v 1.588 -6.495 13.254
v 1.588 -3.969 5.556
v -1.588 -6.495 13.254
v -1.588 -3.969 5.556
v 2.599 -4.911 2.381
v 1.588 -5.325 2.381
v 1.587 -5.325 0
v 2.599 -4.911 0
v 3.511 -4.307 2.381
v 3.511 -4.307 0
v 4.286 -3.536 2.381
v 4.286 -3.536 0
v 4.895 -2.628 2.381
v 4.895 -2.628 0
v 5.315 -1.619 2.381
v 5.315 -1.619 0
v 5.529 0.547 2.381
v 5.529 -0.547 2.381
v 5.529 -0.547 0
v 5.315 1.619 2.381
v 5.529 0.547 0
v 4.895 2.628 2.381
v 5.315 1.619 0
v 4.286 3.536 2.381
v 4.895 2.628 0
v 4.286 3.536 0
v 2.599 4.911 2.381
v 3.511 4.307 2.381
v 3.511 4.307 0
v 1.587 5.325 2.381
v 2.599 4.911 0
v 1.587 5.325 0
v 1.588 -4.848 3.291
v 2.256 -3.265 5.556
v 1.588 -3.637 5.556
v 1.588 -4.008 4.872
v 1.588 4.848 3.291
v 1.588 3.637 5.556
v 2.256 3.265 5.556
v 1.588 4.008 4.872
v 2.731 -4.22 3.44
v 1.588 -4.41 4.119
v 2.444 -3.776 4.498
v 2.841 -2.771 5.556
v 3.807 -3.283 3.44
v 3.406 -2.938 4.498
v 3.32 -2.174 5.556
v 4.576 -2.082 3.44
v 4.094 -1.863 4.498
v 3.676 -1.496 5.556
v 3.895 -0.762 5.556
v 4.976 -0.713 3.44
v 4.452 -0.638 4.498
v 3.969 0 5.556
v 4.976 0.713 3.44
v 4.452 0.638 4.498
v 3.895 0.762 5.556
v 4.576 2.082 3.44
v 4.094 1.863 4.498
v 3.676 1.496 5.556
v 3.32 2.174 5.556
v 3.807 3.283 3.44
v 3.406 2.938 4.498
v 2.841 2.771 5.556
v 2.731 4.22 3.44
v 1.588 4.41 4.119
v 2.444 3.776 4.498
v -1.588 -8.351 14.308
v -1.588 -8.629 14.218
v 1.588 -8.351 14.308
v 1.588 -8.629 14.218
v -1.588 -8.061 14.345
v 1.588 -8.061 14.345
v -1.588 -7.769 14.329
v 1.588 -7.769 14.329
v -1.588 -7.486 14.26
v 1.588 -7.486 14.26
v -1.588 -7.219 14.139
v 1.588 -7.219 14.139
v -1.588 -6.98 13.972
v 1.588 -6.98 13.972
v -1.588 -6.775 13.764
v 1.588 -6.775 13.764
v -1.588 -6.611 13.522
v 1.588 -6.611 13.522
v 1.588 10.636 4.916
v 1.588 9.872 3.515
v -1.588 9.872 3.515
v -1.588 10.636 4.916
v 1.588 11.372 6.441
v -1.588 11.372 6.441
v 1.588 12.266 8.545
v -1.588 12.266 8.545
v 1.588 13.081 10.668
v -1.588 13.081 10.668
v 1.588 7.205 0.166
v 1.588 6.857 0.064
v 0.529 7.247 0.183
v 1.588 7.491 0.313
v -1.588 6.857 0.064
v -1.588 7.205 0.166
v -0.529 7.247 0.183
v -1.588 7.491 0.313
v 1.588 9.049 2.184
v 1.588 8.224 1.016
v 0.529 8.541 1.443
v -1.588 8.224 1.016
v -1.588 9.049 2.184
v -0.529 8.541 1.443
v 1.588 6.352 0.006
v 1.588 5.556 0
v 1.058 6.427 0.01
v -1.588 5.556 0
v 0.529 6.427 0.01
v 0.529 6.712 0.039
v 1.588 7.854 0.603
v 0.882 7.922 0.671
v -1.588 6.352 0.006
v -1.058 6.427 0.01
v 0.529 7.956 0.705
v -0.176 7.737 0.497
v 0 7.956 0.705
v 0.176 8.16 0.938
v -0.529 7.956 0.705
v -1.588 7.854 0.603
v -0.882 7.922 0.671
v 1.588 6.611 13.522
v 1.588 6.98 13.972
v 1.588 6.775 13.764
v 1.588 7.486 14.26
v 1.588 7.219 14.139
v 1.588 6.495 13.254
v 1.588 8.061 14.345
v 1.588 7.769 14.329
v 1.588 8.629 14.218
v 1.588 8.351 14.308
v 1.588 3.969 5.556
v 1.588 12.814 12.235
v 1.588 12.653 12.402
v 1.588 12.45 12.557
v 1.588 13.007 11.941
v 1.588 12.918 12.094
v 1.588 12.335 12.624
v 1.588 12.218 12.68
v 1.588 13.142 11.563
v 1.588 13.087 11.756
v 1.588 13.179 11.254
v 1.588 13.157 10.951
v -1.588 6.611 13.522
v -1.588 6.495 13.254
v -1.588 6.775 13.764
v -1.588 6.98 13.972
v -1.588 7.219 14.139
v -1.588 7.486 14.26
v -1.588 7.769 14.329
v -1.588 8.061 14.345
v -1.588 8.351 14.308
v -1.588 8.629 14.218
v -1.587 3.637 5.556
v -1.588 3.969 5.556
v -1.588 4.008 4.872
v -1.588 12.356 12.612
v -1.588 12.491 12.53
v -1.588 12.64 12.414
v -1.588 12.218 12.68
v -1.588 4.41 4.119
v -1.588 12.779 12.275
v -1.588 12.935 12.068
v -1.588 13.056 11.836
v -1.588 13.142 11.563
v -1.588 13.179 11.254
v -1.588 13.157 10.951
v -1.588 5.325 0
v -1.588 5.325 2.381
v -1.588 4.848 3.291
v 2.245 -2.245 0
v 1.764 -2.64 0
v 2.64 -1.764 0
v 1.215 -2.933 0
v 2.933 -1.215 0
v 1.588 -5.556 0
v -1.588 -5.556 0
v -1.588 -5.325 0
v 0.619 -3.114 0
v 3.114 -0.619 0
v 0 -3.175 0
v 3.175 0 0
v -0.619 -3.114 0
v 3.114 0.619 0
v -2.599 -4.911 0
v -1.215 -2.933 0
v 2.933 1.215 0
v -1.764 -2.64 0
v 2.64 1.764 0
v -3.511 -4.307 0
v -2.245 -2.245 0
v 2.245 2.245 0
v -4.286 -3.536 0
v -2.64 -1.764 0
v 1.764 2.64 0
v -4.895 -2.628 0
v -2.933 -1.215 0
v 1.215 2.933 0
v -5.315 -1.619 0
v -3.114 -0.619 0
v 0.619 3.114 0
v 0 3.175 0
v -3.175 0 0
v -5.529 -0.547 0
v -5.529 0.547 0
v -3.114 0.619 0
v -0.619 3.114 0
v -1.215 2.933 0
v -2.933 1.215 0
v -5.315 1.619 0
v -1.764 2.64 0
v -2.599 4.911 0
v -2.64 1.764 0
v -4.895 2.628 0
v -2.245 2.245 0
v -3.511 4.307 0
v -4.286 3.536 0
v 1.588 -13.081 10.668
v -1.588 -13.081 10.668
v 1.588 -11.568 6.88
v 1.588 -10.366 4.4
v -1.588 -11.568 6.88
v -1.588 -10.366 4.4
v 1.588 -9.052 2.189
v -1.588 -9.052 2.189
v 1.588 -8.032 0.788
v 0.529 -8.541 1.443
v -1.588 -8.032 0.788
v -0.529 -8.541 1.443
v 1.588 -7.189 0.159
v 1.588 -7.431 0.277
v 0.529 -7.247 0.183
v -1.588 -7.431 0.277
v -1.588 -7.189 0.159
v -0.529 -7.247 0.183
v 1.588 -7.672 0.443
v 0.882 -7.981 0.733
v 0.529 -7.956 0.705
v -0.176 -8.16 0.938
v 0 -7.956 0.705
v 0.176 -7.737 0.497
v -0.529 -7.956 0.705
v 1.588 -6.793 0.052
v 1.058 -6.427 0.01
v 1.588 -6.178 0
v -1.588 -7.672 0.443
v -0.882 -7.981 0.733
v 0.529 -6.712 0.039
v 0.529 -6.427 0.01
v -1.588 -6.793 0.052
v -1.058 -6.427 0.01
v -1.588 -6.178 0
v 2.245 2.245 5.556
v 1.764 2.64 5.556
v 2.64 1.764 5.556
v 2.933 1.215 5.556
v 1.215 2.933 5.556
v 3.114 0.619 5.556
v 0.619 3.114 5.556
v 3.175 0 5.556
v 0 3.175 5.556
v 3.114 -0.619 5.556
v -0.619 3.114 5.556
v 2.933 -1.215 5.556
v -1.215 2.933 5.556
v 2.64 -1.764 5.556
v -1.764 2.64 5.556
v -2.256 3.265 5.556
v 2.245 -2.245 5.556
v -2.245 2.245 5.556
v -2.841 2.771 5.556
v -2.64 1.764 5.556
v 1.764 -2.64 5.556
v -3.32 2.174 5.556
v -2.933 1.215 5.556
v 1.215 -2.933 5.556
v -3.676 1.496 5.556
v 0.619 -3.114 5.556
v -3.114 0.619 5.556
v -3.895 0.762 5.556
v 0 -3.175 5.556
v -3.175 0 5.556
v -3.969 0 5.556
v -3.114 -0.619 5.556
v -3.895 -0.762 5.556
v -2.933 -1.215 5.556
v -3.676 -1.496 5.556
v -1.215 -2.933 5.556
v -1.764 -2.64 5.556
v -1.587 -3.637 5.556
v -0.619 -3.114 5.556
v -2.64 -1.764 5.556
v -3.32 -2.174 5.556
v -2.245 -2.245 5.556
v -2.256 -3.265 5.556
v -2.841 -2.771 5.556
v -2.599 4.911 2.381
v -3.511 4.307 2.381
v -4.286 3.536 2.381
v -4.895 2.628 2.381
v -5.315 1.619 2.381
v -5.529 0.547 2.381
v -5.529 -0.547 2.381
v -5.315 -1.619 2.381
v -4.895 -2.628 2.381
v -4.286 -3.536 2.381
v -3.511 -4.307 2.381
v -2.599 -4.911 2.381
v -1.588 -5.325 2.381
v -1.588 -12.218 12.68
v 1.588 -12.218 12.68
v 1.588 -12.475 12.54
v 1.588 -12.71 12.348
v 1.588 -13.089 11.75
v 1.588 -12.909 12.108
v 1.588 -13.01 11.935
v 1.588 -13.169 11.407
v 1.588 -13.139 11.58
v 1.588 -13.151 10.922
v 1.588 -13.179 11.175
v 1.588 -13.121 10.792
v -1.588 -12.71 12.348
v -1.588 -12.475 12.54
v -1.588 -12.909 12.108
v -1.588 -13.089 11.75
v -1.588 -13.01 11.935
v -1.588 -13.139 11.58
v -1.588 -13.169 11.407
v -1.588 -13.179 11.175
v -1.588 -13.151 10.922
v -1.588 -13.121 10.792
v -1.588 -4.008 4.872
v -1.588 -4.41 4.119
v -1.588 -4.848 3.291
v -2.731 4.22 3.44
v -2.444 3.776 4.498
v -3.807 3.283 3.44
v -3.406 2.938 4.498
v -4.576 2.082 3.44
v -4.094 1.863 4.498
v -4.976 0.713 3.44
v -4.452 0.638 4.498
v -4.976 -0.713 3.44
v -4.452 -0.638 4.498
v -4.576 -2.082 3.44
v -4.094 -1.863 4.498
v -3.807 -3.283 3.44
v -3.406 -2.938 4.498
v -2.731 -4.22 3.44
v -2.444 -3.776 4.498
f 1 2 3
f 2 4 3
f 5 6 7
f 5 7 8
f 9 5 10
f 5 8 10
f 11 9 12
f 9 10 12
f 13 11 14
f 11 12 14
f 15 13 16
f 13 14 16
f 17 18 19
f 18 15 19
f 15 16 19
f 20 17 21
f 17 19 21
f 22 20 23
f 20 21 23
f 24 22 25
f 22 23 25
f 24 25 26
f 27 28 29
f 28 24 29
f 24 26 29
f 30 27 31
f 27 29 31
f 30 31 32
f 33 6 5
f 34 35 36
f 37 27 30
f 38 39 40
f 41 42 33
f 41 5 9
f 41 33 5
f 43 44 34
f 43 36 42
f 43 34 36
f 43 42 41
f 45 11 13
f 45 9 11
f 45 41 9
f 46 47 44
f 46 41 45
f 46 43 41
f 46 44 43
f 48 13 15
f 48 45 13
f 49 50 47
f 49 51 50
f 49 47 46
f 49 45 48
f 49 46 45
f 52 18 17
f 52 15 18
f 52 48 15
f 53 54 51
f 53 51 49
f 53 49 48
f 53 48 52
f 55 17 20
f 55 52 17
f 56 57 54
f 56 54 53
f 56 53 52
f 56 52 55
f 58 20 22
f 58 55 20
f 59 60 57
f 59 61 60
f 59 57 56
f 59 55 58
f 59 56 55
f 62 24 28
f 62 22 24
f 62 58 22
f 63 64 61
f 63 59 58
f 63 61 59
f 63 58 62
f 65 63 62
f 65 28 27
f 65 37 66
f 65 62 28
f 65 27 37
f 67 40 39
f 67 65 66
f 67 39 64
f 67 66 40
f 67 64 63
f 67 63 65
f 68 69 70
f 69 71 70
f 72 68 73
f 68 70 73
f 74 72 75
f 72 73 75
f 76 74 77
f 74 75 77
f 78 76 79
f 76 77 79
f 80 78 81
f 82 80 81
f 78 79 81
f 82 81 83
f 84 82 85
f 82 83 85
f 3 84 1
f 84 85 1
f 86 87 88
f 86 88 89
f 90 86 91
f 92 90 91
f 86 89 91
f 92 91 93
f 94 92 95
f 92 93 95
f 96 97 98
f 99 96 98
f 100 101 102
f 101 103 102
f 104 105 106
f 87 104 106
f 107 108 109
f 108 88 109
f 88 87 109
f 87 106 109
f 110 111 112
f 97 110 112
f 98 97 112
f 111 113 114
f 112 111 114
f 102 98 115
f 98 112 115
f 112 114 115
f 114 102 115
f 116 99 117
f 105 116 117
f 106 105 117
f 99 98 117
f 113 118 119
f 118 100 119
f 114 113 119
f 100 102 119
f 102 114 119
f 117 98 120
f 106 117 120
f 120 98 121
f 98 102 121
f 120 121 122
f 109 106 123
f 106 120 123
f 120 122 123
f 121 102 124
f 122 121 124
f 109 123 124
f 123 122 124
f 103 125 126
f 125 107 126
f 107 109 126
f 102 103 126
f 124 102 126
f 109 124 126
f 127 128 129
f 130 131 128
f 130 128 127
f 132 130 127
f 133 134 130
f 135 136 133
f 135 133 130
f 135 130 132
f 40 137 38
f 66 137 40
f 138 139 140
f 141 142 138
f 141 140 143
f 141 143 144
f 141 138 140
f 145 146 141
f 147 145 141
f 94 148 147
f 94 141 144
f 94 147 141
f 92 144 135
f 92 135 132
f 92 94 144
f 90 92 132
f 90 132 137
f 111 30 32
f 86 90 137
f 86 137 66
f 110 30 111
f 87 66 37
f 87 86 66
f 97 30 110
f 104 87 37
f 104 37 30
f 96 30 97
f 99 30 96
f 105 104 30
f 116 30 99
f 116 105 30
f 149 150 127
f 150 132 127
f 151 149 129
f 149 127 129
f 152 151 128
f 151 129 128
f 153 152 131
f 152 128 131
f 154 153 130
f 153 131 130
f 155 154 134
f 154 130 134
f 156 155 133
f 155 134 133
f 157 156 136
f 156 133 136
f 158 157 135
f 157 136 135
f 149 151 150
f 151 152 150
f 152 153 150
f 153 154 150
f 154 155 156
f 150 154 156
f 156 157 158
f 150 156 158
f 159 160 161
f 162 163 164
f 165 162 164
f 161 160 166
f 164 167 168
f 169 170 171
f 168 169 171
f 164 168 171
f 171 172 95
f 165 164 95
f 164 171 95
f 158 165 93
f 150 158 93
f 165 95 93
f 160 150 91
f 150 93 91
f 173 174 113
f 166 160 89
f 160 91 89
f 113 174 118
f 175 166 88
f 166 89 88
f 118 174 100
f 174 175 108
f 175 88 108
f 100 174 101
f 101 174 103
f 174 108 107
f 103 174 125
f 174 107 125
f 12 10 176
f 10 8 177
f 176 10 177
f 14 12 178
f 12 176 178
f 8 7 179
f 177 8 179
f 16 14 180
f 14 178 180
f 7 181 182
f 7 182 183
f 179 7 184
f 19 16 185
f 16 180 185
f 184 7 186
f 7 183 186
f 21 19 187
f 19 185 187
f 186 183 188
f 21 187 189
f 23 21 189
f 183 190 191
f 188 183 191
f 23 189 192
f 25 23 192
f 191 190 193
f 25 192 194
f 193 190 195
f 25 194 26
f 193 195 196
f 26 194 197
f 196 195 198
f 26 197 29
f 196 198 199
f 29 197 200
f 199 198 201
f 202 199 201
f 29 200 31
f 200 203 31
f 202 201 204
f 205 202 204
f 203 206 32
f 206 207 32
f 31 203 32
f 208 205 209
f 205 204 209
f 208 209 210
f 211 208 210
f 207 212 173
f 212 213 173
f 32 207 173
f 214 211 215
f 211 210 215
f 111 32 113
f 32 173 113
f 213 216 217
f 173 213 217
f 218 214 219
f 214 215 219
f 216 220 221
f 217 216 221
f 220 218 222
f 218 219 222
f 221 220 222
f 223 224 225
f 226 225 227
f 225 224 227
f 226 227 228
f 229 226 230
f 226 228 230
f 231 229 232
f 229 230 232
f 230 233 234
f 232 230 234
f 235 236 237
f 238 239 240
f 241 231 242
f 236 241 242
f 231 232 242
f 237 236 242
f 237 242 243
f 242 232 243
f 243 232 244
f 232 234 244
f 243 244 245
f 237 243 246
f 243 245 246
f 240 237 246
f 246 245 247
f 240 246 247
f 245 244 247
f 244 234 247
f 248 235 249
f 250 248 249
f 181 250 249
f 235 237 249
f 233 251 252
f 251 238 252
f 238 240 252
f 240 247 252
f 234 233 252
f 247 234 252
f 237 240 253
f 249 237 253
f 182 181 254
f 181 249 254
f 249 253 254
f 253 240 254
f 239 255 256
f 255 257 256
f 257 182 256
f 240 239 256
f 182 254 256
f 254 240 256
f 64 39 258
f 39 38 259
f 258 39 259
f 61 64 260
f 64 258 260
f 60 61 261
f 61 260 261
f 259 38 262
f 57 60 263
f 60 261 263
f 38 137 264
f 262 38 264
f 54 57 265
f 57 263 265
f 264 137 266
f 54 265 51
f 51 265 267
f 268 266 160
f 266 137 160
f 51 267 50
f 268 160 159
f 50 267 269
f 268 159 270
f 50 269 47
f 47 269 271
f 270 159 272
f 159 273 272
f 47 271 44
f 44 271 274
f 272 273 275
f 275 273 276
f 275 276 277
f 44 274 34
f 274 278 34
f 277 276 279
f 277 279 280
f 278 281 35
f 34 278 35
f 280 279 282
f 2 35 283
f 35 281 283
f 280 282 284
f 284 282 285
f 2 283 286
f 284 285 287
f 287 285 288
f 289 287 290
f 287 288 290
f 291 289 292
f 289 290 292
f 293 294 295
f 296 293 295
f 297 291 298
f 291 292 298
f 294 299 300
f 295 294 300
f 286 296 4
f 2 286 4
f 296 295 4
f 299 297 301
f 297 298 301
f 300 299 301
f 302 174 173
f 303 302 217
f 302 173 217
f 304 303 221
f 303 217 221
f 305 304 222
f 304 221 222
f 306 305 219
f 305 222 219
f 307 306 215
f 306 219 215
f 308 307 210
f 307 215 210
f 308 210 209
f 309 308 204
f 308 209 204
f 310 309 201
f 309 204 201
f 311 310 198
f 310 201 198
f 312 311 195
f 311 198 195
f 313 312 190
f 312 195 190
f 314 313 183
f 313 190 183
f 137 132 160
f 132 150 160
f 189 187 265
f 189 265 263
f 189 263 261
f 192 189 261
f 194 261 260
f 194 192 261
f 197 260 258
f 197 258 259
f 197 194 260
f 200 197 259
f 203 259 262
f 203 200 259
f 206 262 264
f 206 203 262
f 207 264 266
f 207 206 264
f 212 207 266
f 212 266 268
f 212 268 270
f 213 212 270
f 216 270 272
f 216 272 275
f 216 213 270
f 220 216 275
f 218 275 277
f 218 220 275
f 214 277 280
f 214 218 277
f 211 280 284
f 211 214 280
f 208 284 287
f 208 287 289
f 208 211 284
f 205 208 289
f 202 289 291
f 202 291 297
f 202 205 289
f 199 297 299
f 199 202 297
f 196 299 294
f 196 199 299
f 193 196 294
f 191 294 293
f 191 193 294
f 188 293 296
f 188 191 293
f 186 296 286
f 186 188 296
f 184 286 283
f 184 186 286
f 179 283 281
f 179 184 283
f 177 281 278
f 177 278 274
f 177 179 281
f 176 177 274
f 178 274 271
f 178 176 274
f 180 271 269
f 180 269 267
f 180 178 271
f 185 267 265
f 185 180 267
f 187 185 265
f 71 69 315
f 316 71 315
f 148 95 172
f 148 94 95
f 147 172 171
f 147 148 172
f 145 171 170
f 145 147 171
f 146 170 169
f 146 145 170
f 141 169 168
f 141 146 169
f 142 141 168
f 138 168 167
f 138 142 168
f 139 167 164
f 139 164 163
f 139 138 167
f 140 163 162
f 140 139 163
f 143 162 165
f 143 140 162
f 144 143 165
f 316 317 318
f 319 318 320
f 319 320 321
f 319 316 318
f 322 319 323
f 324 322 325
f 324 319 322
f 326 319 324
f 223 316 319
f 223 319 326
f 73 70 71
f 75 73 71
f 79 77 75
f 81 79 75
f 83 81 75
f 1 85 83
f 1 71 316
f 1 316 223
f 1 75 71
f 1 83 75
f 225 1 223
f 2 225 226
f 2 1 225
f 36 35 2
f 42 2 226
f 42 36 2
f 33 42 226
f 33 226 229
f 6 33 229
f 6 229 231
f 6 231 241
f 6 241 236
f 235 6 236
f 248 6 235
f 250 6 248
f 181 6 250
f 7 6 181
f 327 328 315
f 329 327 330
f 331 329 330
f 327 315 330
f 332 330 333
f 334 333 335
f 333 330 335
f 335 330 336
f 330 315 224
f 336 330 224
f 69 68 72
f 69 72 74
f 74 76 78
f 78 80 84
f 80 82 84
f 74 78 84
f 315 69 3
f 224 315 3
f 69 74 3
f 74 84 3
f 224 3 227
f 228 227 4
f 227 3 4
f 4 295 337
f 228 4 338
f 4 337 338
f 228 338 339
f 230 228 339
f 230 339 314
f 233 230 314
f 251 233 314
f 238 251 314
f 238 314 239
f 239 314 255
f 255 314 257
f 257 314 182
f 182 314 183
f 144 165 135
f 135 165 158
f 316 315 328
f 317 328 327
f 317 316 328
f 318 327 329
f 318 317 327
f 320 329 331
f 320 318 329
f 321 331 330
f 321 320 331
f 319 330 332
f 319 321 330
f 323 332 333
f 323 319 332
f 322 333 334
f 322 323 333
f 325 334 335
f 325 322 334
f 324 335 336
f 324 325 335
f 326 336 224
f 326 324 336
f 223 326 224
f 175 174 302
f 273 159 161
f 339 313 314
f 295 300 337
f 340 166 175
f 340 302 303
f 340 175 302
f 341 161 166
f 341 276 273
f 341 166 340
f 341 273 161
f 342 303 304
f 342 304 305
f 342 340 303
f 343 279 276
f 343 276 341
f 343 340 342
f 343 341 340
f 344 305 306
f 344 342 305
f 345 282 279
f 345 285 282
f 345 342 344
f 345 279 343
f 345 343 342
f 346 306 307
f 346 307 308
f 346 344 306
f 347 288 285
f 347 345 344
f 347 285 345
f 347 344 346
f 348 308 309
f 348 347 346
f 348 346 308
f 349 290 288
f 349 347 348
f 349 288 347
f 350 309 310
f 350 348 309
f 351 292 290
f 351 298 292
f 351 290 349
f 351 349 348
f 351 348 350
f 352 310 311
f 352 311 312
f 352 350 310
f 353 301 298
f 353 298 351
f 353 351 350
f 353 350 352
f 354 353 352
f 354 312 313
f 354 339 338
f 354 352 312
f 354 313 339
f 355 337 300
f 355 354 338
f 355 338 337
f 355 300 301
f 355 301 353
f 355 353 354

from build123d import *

# Parameters (mm, degrees)
SKETCH1_R      = 5.55625
SKETCH1_R_2    = 3.175
EXTRUDE1_DEPTH = 5.55625
CHAMFER2_SIZE  = 3.175
CHAMFER2_SIZE2 = 1.5875
EXTRUDE2_START = -1.5875
EXTRUDE2_DEPTH = 3.175
FILLET1_R      = 1.5875


# Read off the part's stored shape, not the designer's step: Extrude2
with BuildPart() as part:
    # Sketch1 → Extrude1 (new body)
    with BuildSketch(Plane.XY):
        Circle(SKETCH1_R)
        Circle(SKETCH1_R_2, mode=Mode.SUBTRACT)
    extrude(amount=EXTRUDE1_DEPTH)

    # Chamfer2
    chamfer2_edges = [part.edges().sort_by_distance(p)[0] for p in [
        (-5.55625, 0, 5.55625),
    ]]
    chamfer2_side = [part.faces().sort_by_distance(p)[0] for p in [
        (-5.55625, 0, 2.778125),
    ]]
    chamfer(chamfer2_edges, length=CHAMFER2_SIZE, length2=CHAMFER2_SIZE2, reference=chamfer2_side[0])

    # Extrude2 outline → Extrude2 (add)
    with BuildSketch(Plane(origin=(0, 0, 0), x_dir=(0, 0, -1), z_dir=(1, 0, 0)).offset(EXTRUDE2_START)):
        with BuildLine():
            add(Edge.make_bspline(
                [(0, 5.55625), (0, 6.123228392), (0.06889711, 7.408271372), (-4.266214485, 10.742230895), (-8.454781371, 12.27379248), (-12.086719505, 13.601821154)],
                knots=[0, 0, 0, 0, 0.111227896, 0.229338963, 1, 1, 1, 1], degree=3))
            Line((-12.086719505, 13.601821154), (-14.900780495, 7.035678846))
            Line((-14.900780495, 7.035678846), (-5.55625, 3.96875))
            Line((-5.55625, 3.96875), (-5.55625, 3.400788734))
            Line((-5.55625, 3.400788734), (-2.261327467, 5.04825))
            Line((-2.261327467, 5.04825), (0, 5.04825))
            Line((0, 5.04825), (0, 5.55625))
        make_face()
        with BuildLine():
            Line((-5.55625, -3.96875), (-14.900780495, -7.035678846))
            Line((-14.900780495, -7.035678846), (-12.086719505, -13.601821154))
            add(Edge.make_bspline(
                [(-12.086719505, -13.601821154), (-8.454781371, -12.27379248), (-4.266214485, -10.742230895), (0.06889711, -7.408271372), (0, -6.123228392), (0, -5.55625)],
                knots=[0, 0, 0, 0, 0.770661037, 0.888772104, 1, 1, 1, 1], degree=3))
            Line((0, -5.55625), (0, -5.04825))
            Line((0, -5.04825), (-2.261327467, -5.04825))
            Line((-2.261327467, -5.04825), (-5.55625, -3.400788734))
            Line((-5.55625, -3.400788734), (-5.55625, -3.96875))
        make_face()
    extrude(amount=EXTRUDE2_DEPTH)

    # Fillet1
    fillet1_edges = [part.edges().sort_by_distance(p)[0] for p in [
        (0, 13.601821154, 12.086719505),
        (0, 7.035678846, 14.900780495),
        (0, -7.035678846, 14.900780495),
        (0, -13.601821154, 12.086719505),
    ]]
    fillet(fillet1_edges, radius=FILLET1_R)


solid = part.part
